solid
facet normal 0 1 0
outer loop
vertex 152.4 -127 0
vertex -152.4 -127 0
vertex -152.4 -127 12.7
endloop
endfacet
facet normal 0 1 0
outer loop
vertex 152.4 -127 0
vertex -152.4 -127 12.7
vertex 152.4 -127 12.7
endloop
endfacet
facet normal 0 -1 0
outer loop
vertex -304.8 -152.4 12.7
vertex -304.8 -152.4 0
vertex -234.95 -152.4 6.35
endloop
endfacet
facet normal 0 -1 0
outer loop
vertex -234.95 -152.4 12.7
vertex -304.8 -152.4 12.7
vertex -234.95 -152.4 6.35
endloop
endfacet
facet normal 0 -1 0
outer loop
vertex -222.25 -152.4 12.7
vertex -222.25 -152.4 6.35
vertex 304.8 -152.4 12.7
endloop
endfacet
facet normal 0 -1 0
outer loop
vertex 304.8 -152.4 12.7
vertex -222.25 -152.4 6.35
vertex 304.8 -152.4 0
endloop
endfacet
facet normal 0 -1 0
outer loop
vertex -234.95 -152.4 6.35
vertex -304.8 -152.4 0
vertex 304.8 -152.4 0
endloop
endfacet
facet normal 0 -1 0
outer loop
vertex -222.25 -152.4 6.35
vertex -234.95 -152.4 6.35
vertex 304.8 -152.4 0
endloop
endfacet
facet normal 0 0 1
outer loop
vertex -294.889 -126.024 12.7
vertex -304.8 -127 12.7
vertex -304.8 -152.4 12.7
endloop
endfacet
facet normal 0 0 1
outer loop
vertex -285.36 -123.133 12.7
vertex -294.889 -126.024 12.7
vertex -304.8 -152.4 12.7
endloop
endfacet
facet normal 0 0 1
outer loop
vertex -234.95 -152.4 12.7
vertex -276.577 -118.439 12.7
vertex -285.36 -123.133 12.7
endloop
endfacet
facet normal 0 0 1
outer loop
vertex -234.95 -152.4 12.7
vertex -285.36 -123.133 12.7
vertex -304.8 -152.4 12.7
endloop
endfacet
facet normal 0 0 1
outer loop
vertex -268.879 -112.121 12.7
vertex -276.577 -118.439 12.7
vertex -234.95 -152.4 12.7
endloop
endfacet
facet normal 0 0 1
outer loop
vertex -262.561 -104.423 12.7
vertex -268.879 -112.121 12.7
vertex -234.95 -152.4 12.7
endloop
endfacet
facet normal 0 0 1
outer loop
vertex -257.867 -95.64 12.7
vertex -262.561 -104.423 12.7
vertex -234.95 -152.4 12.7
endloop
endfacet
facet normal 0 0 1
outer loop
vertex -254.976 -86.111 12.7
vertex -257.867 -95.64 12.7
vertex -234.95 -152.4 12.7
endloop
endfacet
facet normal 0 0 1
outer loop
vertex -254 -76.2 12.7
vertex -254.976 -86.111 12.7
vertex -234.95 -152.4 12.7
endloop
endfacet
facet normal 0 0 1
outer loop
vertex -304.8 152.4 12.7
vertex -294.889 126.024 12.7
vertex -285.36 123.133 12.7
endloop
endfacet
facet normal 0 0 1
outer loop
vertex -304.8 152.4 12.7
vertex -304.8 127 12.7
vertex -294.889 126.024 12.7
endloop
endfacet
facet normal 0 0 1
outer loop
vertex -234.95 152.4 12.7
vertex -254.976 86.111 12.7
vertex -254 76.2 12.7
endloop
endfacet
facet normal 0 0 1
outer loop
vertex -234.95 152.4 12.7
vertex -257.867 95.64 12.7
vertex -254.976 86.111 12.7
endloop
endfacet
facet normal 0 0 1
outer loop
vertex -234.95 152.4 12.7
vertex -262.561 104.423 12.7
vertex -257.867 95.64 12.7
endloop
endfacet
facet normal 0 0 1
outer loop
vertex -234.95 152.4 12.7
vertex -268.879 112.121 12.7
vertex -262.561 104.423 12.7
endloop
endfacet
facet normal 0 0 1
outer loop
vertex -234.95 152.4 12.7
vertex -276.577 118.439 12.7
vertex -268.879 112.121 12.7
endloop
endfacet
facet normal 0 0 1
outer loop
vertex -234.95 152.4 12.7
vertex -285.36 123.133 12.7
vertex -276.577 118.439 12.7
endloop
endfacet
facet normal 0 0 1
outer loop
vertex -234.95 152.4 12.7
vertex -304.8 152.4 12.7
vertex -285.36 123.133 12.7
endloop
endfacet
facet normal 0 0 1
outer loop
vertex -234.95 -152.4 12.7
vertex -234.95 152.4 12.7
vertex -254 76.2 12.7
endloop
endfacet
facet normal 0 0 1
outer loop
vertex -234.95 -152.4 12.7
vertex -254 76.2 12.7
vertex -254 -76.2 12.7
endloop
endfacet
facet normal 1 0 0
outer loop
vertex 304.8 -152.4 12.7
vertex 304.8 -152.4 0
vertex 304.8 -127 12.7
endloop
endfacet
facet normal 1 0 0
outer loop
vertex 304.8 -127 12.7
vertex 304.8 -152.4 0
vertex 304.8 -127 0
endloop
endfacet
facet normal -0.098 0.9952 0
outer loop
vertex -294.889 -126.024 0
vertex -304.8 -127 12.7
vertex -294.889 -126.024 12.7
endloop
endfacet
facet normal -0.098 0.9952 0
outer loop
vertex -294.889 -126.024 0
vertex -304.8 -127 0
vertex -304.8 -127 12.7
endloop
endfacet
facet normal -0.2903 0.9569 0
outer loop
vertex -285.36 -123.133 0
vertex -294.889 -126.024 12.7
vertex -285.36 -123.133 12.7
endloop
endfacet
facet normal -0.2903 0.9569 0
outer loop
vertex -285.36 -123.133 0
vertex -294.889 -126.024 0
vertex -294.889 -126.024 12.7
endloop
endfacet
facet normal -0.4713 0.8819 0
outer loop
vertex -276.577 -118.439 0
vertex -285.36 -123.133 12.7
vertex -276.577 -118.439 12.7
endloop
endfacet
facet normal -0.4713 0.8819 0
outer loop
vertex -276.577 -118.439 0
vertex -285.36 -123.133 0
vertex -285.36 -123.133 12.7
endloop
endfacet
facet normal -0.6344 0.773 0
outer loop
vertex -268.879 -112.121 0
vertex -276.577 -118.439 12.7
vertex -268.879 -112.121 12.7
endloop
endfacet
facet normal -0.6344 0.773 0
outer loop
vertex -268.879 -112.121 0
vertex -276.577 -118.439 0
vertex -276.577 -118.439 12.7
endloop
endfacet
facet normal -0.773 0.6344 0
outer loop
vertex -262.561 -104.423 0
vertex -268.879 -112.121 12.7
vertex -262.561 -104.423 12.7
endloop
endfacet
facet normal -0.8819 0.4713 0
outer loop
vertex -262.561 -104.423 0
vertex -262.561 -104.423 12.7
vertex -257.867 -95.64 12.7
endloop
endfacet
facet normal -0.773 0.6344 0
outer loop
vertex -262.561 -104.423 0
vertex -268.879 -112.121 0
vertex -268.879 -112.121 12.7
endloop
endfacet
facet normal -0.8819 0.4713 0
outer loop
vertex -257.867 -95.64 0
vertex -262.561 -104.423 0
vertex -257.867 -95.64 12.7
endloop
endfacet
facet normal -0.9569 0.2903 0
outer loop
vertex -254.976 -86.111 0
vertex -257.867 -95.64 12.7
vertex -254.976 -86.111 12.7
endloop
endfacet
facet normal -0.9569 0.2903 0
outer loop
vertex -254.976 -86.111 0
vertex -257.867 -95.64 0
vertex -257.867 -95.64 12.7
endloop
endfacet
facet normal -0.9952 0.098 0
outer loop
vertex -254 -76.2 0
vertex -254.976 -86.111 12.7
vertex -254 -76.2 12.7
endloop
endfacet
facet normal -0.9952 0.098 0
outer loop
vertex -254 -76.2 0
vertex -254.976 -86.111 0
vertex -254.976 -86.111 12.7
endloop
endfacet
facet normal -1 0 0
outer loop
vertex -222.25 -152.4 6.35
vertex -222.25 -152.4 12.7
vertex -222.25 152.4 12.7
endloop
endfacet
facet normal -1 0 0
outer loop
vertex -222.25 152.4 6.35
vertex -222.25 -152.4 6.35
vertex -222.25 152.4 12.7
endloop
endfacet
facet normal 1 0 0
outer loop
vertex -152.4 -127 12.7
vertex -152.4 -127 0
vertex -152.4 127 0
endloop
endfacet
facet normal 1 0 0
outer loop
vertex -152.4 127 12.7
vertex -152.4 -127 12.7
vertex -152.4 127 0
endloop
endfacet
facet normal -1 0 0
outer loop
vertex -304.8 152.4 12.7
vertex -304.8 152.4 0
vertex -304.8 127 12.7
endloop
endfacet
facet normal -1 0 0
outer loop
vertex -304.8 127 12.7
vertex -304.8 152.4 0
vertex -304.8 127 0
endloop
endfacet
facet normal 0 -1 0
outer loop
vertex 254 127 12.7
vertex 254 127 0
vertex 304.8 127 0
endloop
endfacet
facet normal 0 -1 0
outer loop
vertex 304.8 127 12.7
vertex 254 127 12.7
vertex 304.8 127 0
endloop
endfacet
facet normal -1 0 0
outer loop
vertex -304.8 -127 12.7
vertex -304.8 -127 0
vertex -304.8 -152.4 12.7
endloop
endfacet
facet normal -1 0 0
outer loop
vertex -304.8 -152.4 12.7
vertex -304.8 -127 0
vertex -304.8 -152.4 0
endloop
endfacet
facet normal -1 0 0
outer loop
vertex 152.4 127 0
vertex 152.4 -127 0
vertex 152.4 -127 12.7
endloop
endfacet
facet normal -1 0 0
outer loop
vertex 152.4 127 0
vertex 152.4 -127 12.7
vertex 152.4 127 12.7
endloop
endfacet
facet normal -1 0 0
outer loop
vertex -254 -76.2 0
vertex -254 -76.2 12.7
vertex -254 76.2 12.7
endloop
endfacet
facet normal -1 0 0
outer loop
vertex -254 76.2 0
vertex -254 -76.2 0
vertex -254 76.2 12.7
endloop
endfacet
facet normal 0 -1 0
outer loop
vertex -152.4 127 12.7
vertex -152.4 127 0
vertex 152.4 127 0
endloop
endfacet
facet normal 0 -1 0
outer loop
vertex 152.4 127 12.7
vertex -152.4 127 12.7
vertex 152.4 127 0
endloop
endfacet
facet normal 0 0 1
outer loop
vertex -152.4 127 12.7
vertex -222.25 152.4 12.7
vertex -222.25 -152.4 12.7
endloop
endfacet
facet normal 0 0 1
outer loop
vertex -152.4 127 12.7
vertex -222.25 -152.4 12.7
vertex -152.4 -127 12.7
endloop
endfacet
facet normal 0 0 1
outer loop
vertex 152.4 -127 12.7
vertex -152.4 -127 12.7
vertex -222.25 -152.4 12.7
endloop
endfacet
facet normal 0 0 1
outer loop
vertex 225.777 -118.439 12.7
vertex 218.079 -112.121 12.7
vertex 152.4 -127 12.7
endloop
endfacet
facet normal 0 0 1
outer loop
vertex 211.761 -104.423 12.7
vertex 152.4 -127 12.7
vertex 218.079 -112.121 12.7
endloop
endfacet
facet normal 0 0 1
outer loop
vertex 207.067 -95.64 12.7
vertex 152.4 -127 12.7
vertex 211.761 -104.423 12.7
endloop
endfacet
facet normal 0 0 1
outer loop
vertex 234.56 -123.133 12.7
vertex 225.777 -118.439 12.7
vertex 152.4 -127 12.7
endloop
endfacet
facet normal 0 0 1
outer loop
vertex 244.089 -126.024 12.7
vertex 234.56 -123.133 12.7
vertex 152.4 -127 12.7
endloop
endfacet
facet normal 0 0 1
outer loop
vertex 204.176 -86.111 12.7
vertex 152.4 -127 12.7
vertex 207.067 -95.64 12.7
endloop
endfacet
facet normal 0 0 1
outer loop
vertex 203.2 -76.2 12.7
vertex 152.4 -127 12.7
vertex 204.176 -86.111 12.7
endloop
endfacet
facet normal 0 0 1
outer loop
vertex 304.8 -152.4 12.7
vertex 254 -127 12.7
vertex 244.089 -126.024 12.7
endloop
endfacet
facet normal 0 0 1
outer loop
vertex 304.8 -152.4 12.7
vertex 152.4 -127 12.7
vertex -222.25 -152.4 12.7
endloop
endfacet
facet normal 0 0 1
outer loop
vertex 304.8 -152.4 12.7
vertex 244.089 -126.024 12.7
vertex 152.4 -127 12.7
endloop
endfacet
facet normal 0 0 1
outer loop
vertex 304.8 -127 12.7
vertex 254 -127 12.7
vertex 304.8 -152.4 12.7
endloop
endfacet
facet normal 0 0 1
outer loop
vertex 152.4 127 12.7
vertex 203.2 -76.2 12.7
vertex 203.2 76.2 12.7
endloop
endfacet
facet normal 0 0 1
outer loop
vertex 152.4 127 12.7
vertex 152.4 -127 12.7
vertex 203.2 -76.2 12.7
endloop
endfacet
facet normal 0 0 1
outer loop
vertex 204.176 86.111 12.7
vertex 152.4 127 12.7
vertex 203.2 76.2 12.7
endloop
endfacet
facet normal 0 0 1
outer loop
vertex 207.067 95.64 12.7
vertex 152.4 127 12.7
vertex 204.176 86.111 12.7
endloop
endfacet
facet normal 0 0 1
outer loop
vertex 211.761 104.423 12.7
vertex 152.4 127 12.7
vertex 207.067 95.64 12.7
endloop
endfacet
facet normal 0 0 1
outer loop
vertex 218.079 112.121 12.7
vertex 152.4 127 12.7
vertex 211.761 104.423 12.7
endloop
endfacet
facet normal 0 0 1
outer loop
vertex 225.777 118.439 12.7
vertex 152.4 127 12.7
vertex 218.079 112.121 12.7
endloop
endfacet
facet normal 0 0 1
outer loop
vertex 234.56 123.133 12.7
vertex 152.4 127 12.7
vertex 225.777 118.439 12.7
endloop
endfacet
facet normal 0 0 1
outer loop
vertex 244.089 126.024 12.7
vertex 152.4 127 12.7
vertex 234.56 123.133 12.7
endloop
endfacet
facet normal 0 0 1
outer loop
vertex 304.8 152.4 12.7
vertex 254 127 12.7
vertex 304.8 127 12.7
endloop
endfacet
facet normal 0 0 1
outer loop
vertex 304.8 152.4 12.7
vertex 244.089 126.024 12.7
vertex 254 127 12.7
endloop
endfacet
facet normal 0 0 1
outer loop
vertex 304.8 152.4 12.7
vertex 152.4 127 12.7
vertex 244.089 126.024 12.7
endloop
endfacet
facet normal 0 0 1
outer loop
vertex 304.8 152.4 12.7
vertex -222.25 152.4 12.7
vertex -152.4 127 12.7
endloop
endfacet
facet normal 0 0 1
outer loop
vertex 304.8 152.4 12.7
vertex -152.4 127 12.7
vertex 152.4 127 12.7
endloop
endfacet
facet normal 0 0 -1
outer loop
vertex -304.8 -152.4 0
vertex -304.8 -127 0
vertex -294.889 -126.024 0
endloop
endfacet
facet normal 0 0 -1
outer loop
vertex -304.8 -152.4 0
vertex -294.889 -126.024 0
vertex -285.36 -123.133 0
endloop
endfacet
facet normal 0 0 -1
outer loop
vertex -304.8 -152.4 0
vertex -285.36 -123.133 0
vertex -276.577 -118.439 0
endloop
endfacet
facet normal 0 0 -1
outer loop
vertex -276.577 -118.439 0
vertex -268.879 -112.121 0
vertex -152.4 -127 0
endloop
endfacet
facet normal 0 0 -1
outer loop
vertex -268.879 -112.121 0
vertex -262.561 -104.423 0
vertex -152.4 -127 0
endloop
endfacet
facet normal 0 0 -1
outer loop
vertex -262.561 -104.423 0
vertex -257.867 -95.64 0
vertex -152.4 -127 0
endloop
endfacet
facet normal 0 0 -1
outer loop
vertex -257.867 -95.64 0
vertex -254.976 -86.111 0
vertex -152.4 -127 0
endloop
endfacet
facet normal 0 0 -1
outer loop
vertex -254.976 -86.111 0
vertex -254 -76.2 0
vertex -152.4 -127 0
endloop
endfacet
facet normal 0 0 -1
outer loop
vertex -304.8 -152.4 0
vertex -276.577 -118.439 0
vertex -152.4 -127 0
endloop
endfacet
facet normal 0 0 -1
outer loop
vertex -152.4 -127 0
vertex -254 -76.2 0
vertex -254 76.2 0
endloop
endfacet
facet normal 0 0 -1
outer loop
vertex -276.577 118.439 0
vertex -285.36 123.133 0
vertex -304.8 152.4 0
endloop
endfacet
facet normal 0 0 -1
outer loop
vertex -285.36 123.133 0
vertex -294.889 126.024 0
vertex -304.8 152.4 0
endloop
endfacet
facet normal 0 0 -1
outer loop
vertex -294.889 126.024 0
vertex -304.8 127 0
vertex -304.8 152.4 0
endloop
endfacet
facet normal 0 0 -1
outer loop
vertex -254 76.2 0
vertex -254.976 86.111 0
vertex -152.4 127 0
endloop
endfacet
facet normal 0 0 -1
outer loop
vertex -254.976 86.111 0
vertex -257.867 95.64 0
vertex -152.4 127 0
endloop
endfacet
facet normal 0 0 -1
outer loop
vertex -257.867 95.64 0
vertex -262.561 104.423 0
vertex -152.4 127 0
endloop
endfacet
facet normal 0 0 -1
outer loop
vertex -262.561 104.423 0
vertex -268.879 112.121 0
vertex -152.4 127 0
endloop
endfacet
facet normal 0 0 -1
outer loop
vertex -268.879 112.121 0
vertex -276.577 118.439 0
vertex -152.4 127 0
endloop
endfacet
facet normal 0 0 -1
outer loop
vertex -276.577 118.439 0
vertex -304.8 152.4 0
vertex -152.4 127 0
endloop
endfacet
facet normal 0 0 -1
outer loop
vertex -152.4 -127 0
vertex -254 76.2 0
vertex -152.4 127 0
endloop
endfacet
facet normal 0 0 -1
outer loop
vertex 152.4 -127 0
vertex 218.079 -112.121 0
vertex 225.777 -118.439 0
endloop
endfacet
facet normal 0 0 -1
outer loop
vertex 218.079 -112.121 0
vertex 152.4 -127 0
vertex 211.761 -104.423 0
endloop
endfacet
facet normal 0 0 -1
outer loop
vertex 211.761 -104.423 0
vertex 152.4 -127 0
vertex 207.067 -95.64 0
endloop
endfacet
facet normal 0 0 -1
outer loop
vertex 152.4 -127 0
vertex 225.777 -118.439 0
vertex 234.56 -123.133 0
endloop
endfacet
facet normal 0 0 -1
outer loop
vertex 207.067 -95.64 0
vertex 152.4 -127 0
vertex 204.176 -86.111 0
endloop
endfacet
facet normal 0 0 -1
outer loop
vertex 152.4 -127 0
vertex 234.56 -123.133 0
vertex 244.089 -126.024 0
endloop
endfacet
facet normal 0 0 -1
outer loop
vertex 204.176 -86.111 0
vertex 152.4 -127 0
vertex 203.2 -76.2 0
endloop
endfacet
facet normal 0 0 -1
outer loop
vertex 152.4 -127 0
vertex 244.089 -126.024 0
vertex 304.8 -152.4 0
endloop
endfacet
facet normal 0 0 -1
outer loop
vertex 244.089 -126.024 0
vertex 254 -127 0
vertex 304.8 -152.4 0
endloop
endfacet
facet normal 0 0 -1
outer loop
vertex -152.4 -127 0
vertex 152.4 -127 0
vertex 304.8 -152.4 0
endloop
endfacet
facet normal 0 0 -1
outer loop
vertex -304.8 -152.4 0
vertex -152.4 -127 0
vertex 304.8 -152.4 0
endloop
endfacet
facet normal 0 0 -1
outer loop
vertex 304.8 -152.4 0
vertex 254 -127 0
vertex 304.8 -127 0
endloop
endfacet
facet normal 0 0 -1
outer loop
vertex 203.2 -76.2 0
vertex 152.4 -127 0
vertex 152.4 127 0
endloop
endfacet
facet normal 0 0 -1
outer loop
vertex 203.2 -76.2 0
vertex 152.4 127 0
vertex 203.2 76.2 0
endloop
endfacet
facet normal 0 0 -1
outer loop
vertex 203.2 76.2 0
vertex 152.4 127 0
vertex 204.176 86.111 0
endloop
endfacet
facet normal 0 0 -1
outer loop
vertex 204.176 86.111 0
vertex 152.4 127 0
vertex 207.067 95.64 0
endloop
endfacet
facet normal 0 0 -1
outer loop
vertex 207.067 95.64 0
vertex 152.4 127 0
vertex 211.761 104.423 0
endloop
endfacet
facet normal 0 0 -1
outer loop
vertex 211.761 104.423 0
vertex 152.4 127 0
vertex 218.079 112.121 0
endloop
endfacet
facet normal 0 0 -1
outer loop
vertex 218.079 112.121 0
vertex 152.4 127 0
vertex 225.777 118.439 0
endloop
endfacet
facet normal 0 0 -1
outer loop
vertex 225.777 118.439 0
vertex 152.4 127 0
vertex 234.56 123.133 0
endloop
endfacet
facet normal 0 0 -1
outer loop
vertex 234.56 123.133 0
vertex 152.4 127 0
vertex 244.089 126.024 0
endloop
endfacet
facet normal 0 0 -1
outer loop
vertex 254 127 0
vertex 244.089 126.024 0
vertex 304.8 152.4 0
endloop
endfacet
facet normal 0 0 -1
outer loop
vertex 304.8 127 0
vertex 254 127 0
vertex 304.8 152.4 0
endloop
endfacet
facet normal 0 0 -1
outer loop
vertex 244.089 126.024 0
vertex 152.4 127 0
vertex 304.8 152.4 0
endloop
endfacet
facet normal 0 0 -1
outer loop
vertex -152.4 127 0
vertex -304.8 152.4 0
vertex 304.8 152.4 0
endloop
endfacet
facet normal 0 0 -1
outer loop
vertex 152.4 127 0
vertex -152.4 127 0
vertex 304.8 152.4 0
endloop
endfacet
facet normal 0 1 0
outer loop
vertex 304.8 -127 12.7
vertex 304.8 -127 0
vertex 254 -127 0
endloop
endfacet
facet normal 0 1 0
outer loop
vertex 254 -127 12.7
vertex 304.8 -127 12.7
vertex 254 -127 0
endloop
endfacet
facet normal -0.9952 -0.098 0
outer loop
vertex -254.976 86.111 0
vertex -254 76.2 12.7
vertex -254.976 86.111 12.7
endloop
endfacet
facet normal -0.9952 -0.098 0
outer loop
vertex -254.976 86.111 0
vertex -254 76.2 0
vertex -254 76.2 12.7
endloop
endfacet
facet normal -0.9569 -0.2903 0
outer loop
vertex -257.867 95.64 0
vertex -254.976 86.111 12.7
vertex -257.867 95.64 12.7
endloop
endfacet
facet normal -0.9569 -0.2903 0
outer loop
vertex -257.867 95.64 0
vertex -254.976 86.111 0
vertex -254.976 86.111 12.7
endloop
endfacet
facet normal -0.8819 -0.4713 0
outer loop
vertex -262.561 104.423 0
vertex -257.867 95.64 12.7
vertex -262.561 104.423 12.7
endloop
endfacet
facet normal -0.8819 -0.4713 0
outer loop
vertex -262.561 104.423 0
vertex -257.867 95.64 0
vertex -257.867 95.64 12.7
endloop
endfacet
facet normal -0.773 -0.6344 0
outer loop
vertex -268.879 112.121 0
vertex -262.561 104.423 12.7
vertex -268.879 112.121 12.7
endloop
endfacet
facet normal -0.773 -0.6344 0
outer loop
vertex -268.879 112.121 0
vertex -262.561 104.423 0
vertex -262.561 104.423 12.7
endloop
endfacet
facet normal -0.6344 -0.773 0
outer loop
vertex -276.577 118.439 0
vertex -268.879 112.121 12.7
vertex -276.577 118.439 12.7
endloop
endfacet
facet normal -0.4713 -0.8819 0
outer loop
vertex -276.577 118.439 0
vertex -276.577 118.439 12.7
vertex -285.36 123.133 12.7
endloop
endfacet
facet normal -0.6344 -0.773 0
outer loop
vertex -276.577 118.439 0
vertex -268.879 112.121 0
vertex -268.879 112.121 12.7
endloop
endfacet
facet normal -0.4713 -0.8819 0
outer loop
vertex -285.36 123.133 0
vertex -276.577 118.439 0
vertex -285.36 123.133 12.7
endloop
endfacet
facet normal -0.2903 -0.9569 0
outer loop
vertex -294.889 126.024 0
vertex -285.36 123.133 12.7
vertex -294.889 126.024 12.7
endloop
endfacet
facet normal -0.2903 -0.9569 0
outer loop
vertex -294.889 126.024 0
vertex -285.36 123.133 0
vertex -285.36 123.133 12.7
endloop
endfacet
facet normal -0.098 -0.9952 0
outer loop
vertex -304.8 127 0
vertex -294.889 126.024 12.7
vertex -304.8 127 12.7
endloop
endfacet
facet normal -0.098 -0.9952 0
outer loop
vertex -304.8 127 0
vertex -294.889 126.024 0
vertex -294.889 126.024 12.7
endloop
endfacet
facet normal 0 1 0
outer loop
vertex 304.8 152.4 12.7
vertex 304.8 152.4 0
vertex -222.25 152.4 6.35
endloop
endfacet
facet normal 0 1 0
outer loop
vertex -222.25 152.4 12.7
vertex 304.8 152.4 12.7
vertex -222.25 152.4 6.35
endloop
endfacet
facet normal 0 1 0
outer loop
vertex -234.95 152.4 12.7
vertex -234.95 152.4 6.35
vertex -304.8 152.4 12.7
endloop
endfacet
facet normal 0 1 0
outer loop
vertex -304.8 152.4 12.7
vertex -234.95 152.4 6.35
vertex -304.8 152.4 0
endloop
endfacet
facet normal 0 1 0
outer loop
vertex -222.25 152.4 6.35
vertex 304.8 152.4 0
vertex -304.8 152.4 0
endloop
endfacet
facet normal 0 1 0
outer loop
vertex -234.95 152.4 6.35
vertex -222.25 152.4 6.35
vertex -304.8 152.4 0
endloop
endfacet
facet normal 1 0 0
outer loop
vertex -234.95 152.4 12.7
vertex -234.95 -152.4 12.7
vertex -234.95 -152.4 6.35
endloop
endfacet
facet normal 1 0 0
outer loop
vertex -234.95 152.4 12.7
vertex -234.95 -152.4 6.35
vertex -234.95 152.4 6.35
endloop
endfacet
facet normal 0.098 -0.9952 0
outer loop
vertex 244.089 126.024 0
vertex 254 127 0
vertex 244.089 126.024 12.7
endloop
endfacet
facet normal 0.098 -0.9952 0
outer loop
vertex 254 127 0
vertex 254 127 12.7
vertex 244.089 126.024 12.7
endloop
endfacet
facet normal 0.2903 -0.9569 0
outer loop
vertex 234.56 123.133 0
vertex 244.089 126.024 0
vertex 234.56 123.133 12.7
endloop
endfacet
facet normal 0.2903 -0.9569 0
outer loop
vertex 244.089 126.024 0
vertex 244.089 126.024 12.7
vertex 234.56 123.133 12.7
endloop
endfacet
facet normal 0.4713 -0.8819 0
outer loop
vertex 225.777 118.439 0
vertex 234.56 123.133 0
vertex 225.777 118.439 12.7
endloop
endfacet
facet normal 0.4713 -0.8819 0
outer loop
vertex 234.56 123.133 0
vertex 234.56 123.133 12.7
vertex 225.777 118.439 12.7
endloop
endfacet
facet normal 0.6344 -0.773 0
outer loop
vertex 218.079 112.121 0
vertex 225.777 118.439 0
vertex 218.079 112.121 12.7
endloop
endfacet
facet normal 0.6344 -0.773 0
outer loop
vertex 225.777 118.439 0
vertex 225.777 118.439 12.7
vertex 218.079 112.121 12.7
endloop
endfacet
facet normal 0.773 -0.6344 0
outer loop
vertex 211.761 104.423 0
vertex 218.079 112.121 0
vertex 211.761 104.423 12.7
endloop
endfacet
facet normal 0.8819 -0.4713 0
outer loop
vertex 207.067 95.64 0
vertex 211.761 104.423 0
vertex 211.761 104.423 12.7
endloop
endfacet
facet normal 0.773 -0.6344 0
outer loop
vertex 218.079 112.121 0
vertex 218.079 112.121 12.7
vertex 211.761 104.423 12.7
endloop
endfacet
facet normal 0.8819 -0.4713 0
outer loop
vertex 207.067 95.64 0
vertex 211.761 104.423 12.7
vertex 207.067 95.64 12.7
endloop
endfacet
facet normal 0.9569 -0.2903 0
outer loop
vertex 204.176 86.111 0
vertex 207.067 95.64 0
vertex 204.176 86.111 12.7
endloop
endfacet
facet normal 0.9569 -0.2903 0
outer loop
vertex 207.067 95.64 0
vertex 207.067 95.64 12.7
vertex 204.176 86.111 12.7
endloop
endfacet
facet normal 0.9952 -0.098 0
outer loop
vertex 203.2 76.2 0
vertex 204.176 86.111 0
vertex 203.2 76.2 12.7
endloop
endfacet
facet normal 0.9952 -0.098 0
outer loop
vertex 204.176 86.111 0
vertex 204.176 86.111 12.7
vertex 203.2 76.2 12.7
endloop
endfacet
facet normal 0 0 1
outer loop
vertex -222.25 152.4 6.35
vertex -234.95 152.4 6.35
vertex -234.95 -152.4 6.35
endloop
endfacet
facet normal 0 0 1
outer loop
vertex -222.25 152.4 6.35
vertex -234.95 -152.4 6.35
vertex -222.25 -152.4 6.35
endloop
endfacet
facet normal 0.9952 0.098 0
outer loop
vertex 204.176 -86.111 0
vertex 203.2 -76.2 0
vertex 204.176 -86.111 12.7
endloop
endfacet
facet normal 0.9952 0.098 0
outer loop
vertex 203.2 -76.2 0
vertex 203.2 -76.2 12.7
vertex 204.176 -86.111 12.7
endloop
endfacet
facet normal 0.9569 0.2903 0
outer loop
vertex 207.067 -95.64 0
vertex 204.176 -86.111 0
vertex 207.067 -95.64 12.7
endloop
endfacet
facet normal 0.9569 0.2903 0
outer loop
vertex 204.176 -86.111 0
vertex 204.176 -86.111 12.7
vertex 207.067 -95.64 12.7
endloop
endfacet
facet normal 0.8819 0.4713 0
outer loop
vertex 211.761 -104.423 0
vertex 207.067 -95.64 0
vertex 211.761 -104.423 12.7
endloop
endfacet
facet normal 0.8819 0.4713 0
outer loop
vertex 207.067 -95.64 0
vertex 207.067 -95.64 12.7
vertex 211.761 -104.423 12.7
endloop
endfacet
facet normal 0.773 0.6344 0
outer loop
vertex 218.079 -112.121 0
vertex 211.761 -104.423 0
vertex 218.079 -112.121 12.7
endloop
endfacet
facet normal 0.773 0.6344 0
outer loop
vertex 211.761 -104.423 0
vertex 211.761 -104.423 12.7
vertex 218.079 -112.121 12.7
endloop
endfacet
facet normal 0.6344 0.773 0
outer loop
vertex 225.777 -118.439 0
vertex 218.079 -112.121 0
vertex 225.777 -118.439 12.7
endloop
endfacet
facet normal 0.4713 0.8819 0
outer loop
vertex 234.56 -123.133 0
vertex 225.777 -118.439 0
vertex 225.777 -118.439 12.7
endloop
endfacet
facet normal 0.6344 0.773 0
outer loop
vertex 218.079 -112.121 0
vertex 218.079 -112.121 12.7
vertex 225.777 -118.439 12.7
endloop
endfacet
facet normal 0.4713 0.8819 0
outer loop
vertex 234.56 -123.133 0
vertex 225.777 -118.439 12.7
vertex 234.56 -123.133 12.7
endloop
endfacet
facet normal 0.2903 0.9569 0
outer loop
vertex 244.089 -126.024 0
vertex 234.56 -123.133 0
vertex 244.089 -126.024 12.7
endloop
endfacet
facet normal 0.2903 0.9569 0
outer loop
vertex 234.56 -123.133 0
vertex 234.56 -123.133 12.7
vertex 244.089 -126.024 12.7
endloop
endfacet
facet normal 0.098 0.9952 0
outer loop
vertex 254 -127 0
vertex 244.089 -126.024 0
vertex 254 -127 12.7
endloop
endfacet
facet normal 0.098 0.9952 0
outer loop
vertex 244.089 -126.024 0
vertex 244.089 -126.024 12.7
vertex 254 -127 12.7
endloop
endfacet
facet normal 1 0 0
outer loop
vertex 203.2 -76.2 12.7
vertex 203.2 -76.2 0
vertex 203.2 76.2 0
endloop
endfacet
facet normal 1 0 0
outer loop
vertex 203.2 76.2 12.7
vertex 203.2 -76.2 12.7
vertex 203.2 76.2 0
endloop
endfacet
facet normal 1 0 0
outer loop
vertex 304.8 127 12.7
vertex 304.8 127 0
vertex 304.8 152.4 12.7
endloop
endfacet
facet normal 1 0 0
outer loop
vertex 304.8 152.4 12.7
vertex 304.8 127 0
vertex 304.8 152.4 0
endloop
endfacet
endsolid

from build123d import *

# Parameters (mm, degrees)
F0_W     = 304.8
F0_H     = 254
F1_DEPTH = 12.7
F2_W     = 12.7
F2_H     = 304.8
F3_DEPTH = 6.35
F4_R     = 50.8
F5_W     = 50.8
F5_H     = 254
F6_DEPTH = 12.7
F7_R     = 50.79999


# Not quite as in the source:
# - a fillet or chamfer is up to 0.001 mm smaller than in the source, because OpenCascade refuses the exact size
# - a feature of the source that left no trace in its solid (it failed there, or was rolled back) is left out


with BuildPart() as f1:
    # F0 (on Top) → F1 (new body)
    with BuildSketch(Plane.XY):
        Polygon((304.8, 127), (304.8, 152.4), (-304.8, 152.4), (-304.8, -152.4), (304.8, -152.4), (304.8, -127), (203.2, -127), (203.2, 127), align=None)
        Rectangle(F0_W, F0_H, mode=Mode.SUBTRACT)
    extrude(amount=F1_DEPTH)

    # F2 (on face) → F3 (cut)
    with BuildSketch(Plane.XY.offset(12.7)):
        with Locations((-228.6, 0)):
            Rectangle(F2_W, F2_H)
    extrude(amount=-F3_DEPTH, mode=Mode.SUBTRACT)

    # F4
    f4_edges = [f1.edges().sort_by_distance(p)[0] for p in [
        (203.2, -127, 6.35),
        (203.2, 127, 6.35),
    ]]
    fillet(f4_edges, radius=F4_R)

    # F5 (on face) → F6 (cut)
    with BuildSketch(Plane.XY.offset(12.7)):
        with Locations((-279.4, 0)):
            Rectangle(F5_W, F5_H)
    extrude(amount=-F6_DEPTH, mode=Mode.SUBTRACT)

    # F7 (radius 50.8 in the source; OpenCascade refuses exactly that, so slightly less here)
    f7_edges = [f1.edges().sort_by_distance(p)[0] for p in [
        (-254, 127, 6.35),
        (-254, -127, 6.35),
    ]]
    fillet(f7_edges, radius=F7_R)


solid = f1.part
